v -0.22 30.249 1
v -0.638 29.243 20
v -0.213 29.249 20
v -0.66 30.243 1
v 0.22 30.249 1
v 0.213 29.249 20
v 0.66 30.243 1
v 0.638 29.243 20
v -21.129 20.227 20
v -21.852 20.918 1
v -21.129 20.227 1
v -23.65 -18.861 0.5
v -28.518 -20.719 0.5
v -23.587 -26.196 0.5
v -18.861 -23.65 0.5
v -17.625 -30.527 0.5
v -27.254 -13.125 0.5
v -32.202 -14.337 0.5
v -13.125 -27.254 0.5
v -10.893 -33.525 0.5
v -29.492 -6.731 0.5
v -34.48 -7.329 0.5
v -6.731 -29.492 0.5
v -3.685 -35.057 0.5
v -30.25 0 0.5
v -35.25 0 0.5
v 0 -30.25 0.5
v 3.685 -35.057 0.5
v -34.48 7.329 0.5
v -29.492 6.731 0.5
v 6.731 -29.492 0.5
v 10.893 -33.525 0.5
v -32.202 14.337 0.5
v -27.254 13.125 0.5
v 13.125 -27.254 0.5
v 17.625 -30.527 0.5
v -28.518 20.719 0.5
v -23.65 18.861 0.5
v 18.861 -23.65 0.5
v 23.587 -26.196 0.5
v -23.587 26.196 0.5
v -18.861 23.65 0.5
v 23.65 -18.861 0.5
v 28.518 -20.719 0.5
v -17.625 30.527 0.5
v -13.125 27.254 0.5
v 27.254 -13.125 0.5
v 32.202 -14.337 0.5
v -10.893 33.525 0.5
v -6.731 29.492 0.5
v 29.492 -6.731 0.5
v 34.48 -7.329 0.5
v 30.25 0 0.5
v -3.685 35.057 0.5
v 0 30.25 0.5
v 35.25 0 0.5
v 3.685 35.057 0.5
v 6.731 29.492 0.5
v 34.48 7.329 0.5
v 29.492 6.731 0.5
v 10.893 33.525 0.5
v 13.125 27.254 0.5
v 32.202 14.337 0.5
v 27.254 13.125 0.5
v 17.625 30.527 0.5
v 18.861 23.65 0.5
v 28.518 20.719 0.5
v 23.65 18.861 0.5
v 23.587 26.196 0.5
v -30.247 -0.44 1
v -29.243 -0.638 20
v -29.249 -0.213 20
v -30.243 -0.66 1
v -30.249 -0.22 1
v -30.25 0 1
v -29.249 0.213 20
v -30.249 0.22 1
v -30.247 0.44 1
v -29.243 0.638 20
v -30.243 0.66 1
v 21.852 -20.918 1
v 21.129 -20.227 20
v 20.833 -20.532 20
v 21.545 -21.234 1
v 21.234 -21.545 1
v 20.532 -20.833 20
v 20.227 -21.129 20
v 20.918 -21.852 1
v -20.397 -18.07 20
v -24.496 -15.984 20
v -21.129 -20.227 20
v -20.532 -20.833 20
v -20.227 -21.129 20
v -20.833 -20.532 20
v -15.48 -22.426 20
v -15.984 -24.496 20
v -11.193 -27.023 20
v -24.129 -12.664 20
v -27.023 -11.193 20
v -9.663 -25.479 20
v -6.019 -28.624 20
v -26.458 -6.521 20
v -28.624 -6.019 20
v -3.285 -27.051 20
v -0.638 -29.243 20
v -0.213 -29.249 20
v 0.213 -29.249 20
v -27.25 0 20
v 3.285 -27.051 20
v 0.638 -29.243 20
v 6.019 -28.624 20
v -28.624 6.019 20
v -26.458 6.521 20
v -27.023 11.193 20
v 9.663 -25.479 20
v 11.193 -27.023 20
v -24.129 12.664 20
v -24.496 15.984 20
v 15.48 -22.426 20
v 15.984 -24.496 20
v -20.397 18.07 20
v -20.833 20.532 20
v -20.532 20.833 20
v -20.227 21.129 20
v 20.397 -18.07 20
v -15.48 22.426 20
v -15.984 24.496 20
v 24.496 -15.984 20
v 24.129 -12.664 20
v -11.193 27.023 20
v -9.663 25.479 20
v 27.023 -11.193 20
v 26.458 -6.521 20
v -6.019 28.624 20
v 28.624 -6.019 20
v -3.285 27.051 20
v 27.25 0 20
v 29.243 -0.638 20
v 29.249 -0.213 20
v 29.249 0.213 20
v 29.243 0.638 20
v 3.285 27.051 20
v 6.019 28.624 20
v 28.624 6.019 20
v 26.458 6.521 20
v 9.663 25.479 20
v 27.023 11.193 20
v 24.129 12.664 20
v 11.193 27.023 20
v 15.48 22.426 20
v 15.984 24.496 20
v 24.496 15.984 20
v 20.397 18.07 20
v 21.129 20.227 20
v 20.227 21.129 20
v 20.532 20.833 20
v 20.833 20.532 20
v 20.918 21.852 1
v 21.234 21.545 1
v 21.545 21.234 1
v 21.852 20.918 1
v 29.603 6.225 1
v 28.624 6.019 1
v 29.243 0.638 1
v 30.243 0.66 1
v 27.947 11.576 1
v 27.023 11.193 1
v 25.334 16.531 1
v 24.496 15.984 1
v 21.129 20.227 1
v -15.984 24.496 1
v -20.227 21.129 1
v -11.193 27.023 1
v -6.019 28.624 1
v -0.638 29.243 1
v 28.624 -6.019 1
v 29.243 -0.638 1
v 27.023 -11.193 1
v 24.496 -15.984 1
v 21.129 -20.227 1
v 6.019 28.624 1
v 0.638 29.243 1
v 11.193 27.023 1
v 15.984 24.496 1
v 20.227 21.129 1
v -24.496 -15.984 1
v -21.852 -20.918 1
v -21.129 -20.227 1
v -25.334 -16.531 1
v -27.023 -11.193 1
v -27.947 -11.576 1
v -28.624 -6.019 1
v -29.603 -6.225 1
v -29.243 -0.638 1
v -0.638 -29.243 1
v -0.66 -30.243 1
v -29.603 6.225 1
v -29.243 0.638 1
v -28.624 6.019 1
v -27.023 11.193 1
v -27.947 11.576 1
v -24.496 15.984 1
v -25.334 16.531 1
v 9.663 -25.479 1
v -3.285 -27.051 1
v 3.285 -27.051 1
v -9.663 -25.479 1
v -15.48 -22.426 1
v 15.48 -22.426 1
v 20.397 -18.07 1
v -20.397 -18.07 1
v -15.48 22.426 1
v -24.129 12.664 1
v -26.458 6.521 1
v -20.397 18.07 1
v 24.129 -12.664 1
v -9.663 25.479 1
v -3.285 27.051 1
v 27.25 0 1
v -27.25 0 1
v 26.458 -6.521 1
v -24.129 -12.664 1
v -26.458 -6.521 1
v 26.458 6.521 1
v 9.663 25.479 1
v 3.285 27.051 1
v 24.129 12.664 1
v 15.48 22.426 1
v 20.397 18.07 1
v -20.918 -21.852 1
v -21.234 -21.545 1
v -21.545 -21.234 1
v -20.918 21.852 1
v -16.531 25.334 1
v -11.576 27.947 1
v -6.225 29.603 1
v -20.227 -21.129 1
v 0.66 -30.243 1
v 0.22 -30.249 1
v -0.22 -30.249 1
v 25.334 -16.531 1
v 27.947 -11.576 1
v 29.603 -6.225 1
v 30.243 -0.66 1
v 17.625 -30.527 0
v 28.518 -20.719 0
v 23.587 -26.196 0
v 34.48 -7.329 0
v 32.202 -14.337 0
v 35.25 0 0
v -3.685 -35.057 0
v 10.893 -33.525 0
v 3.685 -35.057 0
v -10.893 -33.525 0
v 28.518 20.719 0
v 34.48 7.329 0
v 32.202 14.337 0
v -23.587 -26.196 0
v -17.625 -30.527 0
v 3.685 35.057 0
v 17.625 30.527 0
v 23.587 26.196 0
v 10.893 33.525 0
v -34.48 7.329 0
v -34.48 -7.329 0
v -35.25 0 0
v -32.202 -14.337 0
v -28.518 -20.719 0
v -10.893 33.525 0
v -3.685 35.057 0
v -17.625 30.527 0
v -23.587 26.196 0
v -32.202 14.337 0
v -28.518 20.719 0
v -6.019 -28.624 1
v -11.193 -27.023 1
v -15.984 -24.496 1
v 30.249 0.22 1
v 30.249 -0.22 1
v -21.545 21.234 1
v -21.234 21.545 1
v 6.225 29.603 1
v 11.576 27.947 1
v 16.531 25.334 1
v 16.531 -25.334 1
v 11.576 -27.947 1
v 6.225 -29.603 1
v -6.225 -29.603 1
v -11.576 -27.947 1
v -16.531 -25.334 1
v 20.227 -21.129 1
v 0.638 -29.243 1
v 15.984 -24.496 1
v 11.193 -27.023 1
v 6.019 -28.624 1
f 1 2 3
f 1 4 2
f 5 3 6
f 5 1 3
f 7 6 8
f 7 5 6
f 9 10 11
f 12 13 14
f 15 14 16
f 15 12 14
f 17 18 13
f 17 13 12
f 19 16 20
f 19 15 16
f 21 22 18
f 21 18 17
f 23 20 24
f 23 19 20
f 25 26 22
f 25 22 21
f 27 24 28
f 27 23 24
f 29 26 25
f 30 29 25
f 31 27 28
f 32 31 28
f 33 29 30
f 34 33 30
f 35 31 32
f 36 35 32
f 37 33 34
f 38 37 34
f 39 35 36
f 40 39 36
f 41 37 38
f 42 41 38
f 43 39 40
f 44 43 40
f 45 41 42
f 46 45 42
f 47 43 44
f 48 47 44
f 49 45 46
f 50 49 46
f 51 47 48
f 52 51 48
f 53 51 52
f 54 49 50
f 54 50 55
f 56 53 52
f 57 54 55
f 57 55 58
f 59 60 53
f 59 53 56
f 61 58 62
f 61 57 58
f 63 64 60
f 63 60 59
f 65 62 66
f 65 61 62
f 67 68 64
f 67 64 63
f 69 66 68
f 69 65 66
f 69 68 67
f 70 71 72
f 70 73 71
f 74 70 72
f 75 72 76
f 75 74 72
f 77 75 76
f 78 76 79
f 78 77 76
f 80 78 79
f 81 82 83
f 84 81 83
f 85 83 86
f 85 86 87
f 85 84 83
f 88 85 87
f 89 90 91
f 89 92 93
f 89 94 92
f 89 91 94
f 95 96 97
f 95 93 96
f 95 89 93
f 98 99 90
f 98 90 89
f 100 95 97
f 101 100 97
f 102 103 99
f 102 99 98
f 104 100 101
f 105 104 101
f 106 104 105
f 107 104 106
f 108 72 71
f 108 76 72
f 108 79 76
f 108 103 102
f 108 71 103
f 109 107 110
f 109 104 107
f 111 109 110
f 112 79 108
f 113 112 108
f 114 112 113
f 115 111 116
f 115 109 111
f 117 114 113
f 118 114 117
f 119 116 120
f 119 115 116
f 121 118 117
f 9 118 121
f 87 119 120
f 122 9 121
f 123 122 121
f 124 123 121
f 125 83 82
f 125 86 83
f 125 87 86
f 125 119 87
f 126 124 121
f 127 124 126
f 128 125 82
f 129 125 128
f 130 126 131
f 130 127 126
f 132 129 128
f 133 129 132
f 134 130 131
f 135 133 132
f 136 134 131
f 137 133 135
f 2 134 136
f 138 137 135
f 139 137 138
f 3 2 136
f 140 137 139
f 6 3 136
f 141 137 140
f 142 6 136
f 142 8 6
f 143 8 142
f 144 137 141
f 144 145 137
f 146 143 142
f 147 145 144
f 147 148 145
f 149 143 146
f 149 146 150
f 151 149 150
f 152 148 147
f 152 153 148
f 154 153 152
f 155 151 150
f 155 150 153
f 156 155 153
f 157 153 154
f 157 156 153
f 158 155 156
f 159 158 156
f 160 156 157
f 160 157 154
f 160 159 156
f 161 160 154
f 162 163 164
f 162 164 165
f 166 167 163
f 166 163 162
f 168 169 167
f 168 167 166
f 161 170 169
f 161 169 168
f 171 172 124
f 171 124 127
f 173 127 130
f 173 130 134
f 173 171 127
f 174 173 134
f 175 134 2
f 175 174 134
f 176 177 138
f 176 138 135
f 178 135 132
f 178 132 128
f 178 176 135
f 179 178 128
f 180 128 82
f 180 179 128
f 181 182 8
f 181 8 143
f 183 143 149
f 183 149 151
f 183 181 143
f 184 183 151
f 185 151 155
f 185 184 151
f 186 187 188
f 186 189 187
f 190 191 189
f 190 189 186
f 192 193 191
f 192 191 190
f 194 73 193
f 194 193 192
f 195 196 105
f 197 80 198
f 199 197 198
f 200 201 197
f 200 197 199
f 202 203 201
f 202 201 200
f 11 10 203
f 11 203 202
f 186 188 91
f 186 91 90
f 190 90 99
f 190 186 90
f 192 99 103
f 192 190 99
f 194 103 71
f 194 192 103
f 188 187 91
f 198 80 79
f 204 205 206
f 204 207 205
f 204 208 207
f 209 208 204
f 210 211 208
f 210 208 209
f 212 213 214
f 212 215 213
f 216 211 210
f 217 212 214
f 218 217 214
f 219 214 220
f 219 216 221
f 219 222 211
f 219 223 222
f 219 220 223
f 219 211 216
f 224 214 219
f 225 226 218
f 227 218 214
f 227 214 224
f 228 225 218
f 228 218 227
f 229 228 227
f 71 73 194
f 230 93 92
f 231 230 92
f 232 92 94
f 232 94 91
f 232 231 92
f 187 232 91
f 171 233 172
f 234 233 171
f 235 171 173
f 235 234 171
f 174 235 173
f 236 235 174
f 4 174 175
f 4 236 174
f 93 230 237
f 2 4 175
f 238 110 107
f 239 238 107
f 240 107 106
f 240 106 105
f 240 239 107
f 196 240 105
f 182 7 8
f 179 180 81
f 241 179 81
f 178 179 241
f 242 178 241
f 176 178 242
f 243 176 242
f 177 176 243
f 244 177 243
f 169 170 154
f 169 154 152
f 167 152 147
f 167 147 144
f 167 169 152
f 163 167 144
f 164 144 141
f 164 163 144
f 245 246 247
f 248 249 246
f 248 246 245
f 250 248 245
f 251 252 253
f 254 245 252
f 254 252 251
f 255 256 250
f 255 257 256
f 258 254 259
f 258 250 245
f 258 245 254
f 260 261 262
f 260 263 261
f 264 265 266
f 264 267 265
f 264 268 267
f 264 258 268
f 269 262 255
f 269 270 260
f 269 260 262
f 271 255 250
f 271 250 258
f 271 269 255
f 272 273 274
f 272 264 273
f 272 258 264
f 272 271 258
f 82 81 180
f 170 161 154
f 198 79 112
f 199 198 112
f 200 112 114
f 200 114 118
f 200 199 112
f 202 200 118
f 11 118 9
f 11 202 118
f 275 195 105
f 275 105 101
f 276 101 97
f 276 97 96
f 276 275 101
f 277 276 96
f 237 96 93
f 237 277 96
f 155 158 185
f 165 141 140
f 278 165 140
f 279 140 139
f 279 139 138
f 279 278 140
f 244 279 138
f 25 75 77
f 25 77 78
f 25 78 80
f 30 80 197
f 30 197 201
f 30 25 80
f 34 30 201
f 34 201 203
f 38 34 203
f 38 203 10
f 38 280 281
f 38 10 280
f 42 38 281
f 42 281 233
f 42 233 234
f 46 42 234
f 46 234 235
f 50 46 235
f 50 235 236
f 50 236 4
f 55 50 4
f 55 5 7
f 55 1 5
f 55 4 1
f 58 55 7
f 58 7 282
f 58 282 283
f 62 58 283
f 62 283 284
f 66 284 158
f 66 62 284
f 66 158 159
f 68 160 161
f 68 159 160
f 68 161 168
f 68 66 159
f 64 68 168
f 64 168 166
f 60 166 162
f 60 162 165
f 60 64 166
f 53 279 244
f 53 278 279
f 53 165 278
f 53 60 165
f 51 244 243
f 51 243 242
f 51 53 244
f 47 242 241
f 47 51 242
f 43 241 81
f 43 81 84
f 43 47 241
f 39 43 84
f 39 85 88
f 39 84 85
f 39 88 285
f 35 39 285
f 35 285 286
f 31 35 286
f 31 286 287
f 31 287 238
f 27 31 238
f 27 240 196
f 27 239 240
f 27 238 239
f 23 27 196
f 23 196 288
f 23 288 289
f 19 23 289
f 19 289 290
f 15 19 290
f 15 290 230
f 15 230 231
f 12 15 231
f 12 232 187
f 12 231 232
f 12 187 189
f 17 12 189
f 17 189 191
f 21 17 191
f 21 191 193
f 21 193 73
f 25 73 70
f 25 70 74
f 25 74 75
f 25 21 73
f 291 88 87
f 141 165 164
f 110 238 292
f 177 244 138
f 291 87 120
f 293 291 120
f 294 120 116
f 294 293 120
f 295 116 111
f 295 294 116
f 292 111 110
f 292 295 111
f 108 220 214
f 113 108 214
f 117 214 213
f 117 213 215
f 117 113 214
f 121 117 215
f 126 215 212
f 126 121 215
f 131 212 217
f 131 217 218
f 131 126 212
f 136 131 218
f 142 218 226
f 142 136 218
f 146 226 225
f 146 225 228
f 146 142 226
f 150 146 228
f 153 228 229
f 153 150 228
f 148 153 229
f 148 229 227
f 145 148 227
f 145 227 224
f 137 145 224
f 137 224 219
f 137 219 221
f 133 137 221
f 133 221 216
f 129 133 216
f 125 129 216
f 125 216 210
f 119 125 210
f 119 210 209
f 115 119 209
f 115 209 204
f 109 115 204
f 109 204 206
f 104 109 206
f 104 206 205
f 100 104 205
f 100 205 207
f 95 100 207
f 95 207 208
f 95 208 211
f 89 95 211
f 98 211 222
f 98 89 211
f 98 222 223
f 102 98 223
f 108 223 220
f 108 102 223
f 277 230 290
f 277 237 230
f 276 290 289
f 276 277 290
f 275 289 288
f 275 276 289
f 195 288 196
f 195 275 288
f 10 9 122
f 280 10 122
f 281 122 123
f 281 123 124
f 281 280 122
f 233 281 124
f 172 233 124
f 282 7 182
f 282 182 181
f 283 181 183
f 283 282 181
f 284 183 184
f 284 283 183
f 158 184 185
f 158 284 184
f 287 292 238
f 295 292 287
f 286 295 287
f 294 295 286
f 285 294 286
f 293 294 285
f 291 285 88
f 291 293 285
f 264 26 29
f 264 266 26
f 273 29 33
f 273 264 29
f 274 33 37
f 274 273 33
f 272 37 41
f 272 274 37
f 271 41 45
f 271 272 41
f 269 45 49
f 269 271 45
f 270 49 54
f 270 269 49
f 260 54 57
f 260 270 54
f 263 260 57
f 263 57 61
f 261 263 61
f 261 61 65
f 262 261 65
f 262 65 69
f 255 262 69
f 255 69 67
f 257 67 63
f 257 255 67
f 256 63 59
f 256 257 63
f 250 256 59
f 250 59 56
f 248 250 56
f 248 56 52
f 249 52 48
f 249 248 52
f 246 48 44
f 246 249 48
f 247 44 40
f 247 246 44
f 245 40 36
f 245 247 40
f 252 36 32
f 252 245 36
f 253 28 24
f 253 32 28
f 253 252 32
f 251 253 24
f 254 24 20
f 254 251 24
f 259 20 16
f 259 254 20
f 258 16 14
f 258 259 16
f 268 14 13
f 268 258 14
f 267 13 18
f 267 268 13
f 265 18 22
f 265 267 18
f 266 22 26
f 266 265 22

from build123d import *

# Parameters (mm, degrees)
F2_ANGLE_BACK = 1.25
F2_ANGLE      = 2.5
F3_COUNT      = 8


# Not quite as in the source:
# - a feature names something its author has since deleted; it is built from what else it names


with BuildPart() as f1:
    # F0 (on Front) → F1 (revolve)
    with BuildSketch(Plane.XZ):
        Polygon((0, 0.5), (-30.25, 0.5), (-35.25, 0.5), (-35.25, 0), (0, 0), align=None)
        Polygon((-29.25, 1), (-30.25, 1), (-30.25, 0.5), (0, 0.5), (0, 1), (-27.25, 1), (-27.25, 20), (-29.25, 20), align=None)
    revolve(axis=Axis((0, 0, 0.5), (0, 0, -1)))

    # F0 (on Front) → F2 (revolve)
    with BuildSketch(Plane.XZ, mode=Mode.PRIVATE) as f2_sk:
        Polygon((-29.25, 20), (-30.25, 1), (-29.25, 1), align=None)
    revolve(f2_sk.sketch.rotate(Axis((0, 0, 0.5), (0, 0, -1)), -F2_ANGLE_BACK), axis=Axis((0, 0, 0.5), (0, 0, -1)), revolution_arc=F2_ANGLE)

    # F3: F1 ×8 about axis
    f3_axis = Axis((0, 0, 0.5), (0, 0, -1))


with BuildPart() as f1_1:
    add(f1.part)
    for i in range(1, F3_COUNT):
        add(f1.part.rotate(f3_axis, i * 360 / F3_COUNT))


solid = f1_1.part
